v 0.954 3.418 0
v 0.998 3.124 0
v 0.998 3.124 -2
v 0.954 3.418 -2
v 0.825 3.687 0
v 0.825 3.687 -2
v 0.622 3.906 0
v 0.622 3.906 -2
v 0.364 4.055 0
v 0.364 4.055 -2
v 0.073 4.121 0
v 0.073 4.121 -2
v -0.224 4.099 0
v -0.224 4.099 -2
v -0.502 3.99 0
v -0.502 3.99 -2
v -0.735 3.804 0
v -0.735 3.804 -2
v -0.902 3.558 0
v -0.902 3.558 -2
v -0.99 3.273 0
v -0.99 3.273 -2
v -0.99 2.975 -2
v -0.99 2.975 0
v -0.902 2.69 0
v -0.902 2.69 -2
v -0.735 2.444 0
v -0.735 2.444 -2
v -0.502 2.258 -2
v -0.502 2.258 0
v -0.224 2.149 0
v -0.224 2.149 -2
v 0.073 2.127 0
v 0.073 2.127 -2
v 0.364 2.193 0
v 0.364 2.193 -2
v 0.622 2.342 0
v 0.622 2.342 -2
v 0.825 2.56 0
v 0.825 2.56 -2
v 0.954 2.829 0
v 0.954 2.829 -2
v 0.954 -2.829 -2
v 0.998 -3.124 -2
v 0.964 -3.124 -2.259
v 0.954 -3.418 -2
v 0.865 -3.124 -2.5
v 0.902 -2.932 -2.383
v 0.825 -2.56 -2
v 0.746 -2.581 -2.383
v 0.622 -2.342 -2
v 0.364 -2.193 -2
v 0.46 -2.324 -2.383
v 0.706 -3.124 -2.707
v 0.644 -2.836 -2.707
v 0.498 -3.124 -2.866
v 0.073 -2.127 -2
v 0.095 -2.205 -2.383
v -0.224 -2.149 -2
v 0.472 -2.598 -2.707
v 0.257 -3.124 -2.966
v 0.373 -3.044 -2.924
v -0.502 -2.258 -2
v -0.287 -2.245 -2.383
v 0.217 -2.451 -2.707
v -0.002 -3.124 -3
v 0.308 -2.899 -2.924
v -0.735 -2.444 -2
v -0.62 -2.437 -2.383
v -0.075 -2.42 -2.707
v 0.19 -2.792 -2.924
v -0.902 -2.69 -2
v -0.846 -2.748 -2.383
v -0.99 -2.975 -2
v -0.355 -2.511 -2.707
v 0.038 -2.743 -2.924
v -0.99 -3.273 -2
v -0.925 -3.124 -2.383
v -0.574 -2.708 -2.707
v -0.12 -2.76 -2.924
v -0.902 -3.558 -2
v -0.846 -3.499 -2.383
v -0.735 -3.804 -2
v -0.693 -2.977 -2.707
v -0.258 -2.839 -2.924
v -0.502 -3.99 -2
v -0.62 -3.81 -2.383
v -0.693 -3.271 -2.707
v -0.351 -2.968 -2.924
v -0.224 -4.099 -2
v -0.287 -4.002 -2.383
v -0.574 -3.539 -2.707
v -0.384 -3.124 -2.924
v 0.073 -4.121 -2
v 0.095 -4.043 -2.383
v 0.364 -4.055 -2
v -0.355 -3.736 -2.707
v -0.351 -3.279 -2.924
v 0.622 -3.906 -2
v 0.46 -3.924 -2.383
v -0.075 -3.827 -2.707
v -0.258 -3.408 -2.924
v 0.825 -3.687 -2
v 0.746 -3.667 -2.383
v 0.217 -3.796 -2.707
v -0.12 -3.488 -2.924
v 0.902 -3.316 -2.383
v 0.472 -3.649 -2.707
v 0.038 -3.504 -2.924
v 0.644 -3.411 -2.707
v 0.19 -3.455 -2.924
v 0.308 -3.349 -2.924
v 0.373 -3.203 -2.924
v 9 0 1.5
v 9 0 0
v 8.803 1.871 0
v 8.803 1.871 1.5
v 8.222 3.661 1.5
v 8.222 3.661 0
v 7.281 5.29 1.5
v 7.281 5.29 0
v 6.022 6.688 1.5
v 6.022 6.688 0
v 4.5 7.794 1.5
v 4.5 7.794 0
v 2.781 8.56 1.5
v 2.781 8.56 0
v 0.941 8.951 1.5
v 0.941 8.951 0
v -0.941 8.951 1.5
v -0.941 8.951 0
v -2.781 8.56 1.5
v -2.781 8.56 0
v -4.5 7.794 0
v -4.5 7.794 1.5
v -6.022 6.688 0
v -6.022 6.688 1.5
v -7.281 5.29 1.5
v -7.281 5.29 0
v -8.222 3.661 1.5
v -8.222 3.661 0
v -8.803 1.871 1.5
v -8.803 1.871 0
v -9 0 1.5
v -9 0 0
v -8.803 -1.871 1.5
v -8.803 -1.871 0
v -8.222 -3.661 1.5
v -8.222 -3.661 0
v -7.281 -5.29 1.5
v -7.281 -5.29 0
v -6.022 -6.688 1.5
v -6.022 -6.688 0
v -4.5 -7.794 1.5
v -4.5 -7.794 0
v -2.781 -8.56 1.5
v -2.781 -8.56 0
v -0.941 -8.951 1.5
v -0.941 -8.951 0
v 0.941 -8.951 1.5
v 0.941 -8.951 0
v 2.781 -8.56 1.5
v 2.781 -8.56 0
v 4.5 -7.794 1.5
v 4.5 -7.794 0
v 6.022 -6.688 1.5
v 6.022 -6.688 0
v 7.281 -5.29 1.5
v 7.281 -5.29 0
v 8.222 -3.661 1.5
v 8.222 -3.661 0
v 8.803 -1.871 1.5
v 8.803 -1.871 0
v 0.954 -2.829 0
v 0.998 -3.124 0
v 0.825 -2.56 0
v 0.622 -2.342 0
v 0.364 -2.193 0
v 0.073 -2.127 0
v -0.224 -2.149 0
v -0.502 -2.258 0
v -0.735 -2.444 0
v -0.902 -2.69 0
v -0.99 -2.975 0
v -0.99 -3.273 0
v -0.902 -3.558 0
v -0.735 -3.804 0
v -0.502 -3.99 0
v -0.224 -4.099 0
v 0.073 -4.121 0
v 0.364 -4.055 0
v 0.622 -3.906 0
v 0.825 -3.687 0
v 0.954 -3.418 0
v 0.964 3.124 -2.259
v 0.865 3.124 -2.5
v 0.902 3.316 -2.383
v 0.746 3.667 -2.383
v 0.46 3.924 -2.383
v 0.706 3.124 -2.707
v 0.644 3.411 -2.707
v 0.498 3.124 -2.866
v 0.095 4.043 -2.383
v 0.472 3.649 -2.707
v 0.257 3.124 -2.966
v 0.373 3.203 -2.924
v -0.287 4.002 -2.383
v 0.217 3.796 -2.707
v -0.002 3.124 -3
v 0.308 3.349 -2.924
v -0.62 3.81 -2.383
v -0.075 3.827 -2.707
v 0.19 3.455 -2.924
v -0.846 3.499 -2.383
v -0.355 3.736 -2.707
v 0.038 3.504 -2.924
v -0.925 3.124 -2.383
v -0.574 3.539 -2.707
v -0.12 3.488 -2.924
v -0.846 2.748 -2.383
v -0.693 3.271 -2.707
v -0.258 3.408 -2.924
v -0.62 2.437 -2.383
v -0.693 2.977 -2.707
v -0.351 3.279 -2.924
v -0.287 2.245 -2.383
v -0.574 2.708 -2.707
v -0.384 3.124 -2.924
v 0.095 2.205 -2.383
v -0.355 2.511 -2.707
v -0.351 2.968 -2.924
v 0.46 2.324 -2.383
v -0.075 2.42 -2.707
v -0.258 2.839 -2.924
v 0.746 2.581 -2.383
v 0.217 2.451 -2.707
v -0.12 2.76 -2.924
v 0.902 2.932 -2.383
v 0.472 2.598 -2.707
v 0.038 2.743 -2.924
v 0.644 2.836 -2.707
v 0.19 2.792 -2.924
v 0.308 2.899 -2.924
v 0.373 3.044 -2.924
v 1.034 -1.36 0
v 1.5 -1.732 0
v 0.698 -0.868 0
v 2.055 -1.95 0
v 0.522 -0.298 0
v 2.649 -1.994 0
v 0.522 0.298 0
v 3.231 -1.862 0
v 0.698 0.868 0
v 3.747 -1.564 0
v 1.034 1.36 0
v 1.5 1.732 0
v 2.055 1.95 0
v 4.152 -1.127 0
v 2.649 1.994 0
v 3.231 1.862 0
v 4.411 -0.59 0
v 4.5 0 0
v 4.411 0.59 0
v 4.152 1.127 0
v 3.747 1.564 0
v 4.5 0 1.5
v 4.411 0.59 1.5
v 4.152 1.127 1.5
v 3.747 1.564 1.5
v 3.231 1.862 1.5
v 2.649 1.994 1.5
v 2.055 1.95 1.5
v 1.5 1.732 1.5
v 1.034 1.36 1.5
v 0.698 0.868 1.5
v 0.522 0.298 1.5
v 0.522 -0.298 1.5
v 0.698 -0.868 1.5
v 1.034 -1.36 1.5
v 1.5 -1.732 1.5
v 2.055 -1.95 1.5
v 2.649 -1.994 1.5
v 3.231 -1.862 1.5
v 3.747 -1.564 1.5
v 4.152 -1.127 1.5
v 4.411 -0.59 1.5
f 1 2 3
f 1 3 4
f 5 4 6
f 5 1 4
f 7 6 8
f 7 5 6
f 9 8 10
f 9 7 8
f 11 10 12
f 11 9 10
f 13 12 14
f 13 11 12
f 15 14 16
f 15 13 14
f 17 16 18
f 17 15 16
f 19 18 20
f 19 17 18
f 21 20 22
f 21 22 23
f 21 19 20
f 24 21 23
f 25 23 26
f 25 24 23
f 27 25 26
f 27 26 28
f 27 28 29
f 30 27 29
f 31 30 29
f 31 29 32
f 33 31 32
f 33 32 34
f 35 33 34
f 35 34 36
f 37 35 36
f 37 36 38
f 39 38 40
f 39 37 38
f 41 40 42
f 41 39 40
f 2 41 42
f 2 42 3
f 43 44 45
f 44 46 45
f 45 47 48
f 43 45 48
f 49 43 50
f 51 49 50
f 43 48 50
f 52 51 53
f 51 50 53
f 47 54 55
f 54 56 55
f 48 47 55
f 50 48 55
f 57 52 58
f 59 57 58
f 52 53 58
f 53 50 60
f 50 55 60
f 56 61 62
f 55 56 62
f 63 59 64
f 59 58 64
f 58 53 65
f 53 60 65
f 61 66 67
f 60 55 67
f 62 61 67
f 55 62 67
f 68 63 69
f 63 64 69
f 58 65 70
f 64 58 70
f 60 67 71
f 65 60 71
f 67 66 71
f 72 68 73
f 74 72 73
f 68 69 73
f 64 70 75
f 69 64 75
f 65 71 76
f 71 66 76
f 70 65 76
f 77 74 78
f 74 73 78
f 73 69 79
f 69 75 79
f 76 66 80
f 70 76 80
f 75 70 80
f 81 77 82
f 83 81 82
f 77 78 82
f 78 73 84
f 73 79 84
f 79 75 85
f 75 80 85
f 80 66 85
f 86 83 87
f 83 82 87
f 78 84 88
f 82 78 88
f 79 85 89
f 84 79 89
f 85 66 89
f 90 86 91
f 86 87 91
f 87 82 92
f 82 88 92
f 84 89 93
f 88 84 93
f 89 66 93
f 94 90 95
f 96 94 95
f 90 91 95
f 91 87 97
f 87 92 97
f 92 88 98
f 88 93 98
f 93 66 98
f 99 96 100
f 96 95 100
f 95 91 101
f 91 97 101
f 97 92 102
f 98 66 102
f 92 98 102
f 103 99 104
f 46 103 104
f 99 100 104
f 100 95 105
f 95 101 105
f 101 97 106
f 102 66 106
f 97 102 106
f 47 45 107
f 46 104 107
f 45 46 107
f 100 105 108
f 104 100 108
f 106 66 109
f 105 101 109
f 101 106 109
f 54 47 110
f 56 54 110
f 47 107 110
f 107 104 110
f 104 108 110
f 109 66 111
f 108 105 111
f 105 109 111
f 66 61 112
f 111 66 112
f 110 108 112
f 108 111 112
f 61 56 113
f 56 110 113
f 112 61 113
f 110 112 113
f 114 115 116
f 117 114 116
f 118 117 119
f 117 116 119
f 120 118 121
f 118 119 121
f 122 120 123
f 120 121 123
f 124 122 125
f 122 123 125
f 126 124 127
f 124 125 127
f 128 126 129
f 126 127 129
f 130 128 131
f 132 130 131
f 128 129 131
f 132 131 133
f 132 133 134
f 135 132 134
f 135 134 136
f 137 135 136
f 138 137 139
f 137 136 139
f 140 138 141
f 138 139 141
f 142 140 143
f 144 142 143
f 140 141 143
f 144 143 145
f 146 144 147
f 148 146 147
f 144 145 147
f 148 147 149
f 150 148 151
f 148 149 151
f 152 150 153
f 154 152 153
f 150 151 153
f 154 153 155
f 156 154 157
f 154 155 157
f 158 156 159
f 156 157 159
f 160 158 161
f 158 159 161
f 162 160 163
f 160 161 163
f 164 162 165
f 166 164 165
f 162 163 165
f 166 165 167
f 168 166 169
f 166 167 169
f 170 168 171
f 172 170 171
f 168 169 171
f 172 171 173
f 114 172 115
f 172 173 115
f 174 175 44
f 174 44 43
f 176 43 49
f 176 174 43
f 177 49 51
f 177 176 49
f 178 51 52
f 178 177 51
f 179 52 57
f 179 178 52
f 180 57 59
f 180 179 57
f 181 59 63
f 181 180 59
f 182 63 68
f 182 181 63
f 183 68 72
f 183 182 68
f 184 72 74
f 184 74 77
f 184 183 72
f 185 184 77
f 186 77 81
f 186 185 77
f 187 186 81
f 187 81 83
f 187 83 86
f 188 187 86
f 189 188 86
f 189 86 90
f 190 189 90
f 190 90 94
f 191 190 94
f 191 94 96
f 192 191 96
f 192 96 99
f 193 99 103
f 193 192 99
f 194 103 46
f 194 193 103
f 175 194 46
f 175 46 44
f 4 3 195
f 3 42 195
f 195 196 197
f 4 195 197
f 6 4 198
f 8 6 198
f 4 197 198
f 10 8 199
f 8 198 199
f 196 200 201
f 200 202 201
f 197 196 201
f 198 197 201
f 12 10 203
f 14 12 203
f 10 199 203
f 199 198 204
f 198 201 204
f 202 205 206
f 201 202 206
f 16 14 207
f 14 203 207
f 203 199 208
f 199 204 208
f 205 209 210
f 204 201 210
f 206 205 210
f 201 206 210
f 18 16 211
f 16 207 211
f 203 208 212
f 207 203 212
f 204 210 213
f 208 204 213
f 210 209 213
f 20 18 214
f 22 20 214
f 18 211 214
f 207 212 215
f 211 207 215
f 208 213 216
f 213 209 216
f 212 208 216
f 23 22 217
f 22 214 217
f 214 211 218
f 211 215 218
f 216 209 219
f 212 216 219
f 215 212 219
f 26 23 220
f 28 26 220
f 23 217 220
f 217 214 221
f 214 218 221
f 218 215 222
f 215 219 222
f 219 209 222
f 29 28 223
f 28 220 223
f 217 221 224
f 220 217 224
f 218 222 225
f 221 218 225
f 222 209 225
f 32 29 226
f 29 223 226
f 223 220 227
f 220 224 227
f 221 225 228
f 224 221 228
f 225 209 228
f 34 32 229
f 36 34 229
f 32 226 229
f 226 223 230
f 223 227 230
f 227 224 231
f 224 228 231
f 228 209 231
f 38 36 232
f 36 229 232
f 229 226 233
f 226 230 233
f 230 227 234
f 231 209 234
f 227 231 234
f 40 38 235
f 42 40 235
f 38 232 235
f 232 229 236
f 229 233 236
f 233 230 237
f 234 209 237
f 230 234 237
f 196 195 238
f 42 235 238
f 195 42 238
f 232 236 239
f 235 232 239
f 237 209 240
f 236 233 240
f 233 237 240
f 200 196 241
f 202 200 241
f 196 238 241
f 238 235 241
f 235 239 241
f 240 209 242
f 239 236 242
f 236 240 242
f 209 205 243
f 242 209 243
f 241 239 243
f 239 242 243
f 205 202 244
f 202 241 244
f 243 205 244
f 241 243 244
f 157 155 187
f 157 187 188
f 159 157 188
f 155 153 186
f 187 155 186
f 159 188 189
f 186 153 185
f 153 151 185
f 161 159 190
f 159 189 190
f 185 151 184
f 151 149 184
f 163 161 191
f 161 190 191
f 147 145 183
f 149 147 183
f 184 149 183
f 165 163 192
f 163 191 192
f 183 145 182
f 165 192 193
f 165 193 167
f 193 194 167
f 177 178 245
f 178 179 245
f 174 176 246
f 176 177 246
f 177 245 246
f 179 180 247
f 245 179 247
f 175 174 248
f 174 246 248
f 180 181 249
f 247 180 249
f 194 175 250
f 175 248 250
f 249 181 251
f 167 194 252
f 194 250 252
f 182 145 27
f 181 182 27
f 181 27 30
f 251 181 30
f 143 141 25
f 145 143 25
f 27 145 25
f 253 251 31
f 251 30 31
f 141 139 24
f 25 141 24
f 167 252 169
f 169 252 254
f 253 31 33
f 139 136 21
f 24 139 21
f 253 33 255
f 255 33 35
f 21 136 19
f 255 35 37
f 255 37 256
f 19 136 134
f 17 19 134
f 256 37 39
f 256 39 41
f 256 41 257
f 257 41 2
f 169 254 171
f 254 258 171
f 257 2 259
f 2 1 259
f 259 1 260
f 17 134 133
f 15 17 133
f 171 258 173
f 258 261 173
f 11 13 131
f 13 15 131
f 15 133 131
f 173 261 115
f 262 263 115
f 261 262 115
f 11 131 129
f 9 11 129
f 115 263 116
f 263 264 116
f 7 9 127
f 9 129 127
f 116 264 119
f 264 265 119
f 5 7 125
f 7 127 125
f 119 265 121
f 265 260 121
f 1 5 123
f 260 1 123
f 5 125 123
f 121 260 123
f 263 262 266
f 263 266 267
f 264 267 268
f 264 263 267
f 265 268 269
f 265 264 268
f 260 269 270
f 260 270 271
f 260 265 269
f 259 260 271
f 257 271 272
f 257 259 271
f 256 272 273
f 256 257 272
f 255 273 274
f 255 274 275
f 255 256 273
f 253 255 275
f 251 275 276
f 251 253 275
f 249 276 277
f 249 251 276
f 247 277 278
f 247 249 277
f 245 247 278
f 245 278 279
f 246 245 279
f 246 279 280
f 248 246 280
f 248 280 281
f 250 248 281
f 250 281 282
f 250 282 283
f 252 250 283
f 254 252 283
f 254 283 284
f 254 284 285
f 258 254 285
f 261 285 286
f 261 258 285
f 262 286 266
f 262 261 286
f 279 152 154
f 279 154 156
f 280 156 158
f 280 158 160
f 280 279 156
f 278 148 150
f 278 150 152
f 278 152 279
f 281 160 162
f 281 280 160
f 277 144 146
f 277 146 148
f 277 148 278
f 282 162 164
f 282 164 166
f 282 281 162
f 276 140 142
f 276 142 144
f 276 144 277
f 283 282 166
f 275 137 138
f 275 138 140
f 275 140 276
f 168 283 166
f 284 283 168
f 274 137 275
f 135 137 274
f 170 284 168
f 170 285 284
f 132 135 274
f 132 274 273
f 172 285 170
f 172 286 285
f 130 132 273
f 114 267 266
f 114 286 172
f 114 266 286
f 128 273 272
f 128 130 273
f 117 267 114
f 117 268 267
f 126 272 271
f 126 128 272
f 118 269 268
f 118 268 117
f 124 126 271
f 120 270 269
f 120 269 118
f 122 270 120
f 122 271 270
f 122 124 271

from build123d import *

# Parameters (mm, degrees)
SKETCH_2_R      = 9
SKETCH_2_R_2    = 2
EXTRUDE_1_DEPTH = 1.5
SKETCH_2_3_R    = 1
EXTRUDE_3_DEPTH = 3
FILLET_1_R      = 1


with BuildPart() as part:
    # 草图2 → 凸台-拉伸1 (new body)
    with BuildSketch(Plane.XY):
        Circle(SKETCH_2_R)
        with Locations((2.5, 0)):
            Circle(SKETCH_2_R_2, mode=Mode.SUBTRACT)
    extrude(amount=EXTRUDE_1_DEPTH)

    # 草图2<3> → 凸台-拉伸3 (add)
    with BuildSketch(Plane.XY):
        with Locations((-0.001510054, -3.123707411)):
            Circle(SKETCH_2_3_R)
        with Locations((-0.001510054, 3.123707411)):
            Circle(SKETCH_2_3_R)
    extrude(amount=-EXTRUDE_3_DEPTH)

    # 圆角1
    fillet_1_edges = [part.edges().sort_by_distance(p)[0] for p in [
        (-1.001510054, 3.123707411, -3),
        (-1.001510054, -3.123707411, -3),
    ]]
    fillet(fillet_1_edges, radius=FILLET_1_R)


solid = part.part
